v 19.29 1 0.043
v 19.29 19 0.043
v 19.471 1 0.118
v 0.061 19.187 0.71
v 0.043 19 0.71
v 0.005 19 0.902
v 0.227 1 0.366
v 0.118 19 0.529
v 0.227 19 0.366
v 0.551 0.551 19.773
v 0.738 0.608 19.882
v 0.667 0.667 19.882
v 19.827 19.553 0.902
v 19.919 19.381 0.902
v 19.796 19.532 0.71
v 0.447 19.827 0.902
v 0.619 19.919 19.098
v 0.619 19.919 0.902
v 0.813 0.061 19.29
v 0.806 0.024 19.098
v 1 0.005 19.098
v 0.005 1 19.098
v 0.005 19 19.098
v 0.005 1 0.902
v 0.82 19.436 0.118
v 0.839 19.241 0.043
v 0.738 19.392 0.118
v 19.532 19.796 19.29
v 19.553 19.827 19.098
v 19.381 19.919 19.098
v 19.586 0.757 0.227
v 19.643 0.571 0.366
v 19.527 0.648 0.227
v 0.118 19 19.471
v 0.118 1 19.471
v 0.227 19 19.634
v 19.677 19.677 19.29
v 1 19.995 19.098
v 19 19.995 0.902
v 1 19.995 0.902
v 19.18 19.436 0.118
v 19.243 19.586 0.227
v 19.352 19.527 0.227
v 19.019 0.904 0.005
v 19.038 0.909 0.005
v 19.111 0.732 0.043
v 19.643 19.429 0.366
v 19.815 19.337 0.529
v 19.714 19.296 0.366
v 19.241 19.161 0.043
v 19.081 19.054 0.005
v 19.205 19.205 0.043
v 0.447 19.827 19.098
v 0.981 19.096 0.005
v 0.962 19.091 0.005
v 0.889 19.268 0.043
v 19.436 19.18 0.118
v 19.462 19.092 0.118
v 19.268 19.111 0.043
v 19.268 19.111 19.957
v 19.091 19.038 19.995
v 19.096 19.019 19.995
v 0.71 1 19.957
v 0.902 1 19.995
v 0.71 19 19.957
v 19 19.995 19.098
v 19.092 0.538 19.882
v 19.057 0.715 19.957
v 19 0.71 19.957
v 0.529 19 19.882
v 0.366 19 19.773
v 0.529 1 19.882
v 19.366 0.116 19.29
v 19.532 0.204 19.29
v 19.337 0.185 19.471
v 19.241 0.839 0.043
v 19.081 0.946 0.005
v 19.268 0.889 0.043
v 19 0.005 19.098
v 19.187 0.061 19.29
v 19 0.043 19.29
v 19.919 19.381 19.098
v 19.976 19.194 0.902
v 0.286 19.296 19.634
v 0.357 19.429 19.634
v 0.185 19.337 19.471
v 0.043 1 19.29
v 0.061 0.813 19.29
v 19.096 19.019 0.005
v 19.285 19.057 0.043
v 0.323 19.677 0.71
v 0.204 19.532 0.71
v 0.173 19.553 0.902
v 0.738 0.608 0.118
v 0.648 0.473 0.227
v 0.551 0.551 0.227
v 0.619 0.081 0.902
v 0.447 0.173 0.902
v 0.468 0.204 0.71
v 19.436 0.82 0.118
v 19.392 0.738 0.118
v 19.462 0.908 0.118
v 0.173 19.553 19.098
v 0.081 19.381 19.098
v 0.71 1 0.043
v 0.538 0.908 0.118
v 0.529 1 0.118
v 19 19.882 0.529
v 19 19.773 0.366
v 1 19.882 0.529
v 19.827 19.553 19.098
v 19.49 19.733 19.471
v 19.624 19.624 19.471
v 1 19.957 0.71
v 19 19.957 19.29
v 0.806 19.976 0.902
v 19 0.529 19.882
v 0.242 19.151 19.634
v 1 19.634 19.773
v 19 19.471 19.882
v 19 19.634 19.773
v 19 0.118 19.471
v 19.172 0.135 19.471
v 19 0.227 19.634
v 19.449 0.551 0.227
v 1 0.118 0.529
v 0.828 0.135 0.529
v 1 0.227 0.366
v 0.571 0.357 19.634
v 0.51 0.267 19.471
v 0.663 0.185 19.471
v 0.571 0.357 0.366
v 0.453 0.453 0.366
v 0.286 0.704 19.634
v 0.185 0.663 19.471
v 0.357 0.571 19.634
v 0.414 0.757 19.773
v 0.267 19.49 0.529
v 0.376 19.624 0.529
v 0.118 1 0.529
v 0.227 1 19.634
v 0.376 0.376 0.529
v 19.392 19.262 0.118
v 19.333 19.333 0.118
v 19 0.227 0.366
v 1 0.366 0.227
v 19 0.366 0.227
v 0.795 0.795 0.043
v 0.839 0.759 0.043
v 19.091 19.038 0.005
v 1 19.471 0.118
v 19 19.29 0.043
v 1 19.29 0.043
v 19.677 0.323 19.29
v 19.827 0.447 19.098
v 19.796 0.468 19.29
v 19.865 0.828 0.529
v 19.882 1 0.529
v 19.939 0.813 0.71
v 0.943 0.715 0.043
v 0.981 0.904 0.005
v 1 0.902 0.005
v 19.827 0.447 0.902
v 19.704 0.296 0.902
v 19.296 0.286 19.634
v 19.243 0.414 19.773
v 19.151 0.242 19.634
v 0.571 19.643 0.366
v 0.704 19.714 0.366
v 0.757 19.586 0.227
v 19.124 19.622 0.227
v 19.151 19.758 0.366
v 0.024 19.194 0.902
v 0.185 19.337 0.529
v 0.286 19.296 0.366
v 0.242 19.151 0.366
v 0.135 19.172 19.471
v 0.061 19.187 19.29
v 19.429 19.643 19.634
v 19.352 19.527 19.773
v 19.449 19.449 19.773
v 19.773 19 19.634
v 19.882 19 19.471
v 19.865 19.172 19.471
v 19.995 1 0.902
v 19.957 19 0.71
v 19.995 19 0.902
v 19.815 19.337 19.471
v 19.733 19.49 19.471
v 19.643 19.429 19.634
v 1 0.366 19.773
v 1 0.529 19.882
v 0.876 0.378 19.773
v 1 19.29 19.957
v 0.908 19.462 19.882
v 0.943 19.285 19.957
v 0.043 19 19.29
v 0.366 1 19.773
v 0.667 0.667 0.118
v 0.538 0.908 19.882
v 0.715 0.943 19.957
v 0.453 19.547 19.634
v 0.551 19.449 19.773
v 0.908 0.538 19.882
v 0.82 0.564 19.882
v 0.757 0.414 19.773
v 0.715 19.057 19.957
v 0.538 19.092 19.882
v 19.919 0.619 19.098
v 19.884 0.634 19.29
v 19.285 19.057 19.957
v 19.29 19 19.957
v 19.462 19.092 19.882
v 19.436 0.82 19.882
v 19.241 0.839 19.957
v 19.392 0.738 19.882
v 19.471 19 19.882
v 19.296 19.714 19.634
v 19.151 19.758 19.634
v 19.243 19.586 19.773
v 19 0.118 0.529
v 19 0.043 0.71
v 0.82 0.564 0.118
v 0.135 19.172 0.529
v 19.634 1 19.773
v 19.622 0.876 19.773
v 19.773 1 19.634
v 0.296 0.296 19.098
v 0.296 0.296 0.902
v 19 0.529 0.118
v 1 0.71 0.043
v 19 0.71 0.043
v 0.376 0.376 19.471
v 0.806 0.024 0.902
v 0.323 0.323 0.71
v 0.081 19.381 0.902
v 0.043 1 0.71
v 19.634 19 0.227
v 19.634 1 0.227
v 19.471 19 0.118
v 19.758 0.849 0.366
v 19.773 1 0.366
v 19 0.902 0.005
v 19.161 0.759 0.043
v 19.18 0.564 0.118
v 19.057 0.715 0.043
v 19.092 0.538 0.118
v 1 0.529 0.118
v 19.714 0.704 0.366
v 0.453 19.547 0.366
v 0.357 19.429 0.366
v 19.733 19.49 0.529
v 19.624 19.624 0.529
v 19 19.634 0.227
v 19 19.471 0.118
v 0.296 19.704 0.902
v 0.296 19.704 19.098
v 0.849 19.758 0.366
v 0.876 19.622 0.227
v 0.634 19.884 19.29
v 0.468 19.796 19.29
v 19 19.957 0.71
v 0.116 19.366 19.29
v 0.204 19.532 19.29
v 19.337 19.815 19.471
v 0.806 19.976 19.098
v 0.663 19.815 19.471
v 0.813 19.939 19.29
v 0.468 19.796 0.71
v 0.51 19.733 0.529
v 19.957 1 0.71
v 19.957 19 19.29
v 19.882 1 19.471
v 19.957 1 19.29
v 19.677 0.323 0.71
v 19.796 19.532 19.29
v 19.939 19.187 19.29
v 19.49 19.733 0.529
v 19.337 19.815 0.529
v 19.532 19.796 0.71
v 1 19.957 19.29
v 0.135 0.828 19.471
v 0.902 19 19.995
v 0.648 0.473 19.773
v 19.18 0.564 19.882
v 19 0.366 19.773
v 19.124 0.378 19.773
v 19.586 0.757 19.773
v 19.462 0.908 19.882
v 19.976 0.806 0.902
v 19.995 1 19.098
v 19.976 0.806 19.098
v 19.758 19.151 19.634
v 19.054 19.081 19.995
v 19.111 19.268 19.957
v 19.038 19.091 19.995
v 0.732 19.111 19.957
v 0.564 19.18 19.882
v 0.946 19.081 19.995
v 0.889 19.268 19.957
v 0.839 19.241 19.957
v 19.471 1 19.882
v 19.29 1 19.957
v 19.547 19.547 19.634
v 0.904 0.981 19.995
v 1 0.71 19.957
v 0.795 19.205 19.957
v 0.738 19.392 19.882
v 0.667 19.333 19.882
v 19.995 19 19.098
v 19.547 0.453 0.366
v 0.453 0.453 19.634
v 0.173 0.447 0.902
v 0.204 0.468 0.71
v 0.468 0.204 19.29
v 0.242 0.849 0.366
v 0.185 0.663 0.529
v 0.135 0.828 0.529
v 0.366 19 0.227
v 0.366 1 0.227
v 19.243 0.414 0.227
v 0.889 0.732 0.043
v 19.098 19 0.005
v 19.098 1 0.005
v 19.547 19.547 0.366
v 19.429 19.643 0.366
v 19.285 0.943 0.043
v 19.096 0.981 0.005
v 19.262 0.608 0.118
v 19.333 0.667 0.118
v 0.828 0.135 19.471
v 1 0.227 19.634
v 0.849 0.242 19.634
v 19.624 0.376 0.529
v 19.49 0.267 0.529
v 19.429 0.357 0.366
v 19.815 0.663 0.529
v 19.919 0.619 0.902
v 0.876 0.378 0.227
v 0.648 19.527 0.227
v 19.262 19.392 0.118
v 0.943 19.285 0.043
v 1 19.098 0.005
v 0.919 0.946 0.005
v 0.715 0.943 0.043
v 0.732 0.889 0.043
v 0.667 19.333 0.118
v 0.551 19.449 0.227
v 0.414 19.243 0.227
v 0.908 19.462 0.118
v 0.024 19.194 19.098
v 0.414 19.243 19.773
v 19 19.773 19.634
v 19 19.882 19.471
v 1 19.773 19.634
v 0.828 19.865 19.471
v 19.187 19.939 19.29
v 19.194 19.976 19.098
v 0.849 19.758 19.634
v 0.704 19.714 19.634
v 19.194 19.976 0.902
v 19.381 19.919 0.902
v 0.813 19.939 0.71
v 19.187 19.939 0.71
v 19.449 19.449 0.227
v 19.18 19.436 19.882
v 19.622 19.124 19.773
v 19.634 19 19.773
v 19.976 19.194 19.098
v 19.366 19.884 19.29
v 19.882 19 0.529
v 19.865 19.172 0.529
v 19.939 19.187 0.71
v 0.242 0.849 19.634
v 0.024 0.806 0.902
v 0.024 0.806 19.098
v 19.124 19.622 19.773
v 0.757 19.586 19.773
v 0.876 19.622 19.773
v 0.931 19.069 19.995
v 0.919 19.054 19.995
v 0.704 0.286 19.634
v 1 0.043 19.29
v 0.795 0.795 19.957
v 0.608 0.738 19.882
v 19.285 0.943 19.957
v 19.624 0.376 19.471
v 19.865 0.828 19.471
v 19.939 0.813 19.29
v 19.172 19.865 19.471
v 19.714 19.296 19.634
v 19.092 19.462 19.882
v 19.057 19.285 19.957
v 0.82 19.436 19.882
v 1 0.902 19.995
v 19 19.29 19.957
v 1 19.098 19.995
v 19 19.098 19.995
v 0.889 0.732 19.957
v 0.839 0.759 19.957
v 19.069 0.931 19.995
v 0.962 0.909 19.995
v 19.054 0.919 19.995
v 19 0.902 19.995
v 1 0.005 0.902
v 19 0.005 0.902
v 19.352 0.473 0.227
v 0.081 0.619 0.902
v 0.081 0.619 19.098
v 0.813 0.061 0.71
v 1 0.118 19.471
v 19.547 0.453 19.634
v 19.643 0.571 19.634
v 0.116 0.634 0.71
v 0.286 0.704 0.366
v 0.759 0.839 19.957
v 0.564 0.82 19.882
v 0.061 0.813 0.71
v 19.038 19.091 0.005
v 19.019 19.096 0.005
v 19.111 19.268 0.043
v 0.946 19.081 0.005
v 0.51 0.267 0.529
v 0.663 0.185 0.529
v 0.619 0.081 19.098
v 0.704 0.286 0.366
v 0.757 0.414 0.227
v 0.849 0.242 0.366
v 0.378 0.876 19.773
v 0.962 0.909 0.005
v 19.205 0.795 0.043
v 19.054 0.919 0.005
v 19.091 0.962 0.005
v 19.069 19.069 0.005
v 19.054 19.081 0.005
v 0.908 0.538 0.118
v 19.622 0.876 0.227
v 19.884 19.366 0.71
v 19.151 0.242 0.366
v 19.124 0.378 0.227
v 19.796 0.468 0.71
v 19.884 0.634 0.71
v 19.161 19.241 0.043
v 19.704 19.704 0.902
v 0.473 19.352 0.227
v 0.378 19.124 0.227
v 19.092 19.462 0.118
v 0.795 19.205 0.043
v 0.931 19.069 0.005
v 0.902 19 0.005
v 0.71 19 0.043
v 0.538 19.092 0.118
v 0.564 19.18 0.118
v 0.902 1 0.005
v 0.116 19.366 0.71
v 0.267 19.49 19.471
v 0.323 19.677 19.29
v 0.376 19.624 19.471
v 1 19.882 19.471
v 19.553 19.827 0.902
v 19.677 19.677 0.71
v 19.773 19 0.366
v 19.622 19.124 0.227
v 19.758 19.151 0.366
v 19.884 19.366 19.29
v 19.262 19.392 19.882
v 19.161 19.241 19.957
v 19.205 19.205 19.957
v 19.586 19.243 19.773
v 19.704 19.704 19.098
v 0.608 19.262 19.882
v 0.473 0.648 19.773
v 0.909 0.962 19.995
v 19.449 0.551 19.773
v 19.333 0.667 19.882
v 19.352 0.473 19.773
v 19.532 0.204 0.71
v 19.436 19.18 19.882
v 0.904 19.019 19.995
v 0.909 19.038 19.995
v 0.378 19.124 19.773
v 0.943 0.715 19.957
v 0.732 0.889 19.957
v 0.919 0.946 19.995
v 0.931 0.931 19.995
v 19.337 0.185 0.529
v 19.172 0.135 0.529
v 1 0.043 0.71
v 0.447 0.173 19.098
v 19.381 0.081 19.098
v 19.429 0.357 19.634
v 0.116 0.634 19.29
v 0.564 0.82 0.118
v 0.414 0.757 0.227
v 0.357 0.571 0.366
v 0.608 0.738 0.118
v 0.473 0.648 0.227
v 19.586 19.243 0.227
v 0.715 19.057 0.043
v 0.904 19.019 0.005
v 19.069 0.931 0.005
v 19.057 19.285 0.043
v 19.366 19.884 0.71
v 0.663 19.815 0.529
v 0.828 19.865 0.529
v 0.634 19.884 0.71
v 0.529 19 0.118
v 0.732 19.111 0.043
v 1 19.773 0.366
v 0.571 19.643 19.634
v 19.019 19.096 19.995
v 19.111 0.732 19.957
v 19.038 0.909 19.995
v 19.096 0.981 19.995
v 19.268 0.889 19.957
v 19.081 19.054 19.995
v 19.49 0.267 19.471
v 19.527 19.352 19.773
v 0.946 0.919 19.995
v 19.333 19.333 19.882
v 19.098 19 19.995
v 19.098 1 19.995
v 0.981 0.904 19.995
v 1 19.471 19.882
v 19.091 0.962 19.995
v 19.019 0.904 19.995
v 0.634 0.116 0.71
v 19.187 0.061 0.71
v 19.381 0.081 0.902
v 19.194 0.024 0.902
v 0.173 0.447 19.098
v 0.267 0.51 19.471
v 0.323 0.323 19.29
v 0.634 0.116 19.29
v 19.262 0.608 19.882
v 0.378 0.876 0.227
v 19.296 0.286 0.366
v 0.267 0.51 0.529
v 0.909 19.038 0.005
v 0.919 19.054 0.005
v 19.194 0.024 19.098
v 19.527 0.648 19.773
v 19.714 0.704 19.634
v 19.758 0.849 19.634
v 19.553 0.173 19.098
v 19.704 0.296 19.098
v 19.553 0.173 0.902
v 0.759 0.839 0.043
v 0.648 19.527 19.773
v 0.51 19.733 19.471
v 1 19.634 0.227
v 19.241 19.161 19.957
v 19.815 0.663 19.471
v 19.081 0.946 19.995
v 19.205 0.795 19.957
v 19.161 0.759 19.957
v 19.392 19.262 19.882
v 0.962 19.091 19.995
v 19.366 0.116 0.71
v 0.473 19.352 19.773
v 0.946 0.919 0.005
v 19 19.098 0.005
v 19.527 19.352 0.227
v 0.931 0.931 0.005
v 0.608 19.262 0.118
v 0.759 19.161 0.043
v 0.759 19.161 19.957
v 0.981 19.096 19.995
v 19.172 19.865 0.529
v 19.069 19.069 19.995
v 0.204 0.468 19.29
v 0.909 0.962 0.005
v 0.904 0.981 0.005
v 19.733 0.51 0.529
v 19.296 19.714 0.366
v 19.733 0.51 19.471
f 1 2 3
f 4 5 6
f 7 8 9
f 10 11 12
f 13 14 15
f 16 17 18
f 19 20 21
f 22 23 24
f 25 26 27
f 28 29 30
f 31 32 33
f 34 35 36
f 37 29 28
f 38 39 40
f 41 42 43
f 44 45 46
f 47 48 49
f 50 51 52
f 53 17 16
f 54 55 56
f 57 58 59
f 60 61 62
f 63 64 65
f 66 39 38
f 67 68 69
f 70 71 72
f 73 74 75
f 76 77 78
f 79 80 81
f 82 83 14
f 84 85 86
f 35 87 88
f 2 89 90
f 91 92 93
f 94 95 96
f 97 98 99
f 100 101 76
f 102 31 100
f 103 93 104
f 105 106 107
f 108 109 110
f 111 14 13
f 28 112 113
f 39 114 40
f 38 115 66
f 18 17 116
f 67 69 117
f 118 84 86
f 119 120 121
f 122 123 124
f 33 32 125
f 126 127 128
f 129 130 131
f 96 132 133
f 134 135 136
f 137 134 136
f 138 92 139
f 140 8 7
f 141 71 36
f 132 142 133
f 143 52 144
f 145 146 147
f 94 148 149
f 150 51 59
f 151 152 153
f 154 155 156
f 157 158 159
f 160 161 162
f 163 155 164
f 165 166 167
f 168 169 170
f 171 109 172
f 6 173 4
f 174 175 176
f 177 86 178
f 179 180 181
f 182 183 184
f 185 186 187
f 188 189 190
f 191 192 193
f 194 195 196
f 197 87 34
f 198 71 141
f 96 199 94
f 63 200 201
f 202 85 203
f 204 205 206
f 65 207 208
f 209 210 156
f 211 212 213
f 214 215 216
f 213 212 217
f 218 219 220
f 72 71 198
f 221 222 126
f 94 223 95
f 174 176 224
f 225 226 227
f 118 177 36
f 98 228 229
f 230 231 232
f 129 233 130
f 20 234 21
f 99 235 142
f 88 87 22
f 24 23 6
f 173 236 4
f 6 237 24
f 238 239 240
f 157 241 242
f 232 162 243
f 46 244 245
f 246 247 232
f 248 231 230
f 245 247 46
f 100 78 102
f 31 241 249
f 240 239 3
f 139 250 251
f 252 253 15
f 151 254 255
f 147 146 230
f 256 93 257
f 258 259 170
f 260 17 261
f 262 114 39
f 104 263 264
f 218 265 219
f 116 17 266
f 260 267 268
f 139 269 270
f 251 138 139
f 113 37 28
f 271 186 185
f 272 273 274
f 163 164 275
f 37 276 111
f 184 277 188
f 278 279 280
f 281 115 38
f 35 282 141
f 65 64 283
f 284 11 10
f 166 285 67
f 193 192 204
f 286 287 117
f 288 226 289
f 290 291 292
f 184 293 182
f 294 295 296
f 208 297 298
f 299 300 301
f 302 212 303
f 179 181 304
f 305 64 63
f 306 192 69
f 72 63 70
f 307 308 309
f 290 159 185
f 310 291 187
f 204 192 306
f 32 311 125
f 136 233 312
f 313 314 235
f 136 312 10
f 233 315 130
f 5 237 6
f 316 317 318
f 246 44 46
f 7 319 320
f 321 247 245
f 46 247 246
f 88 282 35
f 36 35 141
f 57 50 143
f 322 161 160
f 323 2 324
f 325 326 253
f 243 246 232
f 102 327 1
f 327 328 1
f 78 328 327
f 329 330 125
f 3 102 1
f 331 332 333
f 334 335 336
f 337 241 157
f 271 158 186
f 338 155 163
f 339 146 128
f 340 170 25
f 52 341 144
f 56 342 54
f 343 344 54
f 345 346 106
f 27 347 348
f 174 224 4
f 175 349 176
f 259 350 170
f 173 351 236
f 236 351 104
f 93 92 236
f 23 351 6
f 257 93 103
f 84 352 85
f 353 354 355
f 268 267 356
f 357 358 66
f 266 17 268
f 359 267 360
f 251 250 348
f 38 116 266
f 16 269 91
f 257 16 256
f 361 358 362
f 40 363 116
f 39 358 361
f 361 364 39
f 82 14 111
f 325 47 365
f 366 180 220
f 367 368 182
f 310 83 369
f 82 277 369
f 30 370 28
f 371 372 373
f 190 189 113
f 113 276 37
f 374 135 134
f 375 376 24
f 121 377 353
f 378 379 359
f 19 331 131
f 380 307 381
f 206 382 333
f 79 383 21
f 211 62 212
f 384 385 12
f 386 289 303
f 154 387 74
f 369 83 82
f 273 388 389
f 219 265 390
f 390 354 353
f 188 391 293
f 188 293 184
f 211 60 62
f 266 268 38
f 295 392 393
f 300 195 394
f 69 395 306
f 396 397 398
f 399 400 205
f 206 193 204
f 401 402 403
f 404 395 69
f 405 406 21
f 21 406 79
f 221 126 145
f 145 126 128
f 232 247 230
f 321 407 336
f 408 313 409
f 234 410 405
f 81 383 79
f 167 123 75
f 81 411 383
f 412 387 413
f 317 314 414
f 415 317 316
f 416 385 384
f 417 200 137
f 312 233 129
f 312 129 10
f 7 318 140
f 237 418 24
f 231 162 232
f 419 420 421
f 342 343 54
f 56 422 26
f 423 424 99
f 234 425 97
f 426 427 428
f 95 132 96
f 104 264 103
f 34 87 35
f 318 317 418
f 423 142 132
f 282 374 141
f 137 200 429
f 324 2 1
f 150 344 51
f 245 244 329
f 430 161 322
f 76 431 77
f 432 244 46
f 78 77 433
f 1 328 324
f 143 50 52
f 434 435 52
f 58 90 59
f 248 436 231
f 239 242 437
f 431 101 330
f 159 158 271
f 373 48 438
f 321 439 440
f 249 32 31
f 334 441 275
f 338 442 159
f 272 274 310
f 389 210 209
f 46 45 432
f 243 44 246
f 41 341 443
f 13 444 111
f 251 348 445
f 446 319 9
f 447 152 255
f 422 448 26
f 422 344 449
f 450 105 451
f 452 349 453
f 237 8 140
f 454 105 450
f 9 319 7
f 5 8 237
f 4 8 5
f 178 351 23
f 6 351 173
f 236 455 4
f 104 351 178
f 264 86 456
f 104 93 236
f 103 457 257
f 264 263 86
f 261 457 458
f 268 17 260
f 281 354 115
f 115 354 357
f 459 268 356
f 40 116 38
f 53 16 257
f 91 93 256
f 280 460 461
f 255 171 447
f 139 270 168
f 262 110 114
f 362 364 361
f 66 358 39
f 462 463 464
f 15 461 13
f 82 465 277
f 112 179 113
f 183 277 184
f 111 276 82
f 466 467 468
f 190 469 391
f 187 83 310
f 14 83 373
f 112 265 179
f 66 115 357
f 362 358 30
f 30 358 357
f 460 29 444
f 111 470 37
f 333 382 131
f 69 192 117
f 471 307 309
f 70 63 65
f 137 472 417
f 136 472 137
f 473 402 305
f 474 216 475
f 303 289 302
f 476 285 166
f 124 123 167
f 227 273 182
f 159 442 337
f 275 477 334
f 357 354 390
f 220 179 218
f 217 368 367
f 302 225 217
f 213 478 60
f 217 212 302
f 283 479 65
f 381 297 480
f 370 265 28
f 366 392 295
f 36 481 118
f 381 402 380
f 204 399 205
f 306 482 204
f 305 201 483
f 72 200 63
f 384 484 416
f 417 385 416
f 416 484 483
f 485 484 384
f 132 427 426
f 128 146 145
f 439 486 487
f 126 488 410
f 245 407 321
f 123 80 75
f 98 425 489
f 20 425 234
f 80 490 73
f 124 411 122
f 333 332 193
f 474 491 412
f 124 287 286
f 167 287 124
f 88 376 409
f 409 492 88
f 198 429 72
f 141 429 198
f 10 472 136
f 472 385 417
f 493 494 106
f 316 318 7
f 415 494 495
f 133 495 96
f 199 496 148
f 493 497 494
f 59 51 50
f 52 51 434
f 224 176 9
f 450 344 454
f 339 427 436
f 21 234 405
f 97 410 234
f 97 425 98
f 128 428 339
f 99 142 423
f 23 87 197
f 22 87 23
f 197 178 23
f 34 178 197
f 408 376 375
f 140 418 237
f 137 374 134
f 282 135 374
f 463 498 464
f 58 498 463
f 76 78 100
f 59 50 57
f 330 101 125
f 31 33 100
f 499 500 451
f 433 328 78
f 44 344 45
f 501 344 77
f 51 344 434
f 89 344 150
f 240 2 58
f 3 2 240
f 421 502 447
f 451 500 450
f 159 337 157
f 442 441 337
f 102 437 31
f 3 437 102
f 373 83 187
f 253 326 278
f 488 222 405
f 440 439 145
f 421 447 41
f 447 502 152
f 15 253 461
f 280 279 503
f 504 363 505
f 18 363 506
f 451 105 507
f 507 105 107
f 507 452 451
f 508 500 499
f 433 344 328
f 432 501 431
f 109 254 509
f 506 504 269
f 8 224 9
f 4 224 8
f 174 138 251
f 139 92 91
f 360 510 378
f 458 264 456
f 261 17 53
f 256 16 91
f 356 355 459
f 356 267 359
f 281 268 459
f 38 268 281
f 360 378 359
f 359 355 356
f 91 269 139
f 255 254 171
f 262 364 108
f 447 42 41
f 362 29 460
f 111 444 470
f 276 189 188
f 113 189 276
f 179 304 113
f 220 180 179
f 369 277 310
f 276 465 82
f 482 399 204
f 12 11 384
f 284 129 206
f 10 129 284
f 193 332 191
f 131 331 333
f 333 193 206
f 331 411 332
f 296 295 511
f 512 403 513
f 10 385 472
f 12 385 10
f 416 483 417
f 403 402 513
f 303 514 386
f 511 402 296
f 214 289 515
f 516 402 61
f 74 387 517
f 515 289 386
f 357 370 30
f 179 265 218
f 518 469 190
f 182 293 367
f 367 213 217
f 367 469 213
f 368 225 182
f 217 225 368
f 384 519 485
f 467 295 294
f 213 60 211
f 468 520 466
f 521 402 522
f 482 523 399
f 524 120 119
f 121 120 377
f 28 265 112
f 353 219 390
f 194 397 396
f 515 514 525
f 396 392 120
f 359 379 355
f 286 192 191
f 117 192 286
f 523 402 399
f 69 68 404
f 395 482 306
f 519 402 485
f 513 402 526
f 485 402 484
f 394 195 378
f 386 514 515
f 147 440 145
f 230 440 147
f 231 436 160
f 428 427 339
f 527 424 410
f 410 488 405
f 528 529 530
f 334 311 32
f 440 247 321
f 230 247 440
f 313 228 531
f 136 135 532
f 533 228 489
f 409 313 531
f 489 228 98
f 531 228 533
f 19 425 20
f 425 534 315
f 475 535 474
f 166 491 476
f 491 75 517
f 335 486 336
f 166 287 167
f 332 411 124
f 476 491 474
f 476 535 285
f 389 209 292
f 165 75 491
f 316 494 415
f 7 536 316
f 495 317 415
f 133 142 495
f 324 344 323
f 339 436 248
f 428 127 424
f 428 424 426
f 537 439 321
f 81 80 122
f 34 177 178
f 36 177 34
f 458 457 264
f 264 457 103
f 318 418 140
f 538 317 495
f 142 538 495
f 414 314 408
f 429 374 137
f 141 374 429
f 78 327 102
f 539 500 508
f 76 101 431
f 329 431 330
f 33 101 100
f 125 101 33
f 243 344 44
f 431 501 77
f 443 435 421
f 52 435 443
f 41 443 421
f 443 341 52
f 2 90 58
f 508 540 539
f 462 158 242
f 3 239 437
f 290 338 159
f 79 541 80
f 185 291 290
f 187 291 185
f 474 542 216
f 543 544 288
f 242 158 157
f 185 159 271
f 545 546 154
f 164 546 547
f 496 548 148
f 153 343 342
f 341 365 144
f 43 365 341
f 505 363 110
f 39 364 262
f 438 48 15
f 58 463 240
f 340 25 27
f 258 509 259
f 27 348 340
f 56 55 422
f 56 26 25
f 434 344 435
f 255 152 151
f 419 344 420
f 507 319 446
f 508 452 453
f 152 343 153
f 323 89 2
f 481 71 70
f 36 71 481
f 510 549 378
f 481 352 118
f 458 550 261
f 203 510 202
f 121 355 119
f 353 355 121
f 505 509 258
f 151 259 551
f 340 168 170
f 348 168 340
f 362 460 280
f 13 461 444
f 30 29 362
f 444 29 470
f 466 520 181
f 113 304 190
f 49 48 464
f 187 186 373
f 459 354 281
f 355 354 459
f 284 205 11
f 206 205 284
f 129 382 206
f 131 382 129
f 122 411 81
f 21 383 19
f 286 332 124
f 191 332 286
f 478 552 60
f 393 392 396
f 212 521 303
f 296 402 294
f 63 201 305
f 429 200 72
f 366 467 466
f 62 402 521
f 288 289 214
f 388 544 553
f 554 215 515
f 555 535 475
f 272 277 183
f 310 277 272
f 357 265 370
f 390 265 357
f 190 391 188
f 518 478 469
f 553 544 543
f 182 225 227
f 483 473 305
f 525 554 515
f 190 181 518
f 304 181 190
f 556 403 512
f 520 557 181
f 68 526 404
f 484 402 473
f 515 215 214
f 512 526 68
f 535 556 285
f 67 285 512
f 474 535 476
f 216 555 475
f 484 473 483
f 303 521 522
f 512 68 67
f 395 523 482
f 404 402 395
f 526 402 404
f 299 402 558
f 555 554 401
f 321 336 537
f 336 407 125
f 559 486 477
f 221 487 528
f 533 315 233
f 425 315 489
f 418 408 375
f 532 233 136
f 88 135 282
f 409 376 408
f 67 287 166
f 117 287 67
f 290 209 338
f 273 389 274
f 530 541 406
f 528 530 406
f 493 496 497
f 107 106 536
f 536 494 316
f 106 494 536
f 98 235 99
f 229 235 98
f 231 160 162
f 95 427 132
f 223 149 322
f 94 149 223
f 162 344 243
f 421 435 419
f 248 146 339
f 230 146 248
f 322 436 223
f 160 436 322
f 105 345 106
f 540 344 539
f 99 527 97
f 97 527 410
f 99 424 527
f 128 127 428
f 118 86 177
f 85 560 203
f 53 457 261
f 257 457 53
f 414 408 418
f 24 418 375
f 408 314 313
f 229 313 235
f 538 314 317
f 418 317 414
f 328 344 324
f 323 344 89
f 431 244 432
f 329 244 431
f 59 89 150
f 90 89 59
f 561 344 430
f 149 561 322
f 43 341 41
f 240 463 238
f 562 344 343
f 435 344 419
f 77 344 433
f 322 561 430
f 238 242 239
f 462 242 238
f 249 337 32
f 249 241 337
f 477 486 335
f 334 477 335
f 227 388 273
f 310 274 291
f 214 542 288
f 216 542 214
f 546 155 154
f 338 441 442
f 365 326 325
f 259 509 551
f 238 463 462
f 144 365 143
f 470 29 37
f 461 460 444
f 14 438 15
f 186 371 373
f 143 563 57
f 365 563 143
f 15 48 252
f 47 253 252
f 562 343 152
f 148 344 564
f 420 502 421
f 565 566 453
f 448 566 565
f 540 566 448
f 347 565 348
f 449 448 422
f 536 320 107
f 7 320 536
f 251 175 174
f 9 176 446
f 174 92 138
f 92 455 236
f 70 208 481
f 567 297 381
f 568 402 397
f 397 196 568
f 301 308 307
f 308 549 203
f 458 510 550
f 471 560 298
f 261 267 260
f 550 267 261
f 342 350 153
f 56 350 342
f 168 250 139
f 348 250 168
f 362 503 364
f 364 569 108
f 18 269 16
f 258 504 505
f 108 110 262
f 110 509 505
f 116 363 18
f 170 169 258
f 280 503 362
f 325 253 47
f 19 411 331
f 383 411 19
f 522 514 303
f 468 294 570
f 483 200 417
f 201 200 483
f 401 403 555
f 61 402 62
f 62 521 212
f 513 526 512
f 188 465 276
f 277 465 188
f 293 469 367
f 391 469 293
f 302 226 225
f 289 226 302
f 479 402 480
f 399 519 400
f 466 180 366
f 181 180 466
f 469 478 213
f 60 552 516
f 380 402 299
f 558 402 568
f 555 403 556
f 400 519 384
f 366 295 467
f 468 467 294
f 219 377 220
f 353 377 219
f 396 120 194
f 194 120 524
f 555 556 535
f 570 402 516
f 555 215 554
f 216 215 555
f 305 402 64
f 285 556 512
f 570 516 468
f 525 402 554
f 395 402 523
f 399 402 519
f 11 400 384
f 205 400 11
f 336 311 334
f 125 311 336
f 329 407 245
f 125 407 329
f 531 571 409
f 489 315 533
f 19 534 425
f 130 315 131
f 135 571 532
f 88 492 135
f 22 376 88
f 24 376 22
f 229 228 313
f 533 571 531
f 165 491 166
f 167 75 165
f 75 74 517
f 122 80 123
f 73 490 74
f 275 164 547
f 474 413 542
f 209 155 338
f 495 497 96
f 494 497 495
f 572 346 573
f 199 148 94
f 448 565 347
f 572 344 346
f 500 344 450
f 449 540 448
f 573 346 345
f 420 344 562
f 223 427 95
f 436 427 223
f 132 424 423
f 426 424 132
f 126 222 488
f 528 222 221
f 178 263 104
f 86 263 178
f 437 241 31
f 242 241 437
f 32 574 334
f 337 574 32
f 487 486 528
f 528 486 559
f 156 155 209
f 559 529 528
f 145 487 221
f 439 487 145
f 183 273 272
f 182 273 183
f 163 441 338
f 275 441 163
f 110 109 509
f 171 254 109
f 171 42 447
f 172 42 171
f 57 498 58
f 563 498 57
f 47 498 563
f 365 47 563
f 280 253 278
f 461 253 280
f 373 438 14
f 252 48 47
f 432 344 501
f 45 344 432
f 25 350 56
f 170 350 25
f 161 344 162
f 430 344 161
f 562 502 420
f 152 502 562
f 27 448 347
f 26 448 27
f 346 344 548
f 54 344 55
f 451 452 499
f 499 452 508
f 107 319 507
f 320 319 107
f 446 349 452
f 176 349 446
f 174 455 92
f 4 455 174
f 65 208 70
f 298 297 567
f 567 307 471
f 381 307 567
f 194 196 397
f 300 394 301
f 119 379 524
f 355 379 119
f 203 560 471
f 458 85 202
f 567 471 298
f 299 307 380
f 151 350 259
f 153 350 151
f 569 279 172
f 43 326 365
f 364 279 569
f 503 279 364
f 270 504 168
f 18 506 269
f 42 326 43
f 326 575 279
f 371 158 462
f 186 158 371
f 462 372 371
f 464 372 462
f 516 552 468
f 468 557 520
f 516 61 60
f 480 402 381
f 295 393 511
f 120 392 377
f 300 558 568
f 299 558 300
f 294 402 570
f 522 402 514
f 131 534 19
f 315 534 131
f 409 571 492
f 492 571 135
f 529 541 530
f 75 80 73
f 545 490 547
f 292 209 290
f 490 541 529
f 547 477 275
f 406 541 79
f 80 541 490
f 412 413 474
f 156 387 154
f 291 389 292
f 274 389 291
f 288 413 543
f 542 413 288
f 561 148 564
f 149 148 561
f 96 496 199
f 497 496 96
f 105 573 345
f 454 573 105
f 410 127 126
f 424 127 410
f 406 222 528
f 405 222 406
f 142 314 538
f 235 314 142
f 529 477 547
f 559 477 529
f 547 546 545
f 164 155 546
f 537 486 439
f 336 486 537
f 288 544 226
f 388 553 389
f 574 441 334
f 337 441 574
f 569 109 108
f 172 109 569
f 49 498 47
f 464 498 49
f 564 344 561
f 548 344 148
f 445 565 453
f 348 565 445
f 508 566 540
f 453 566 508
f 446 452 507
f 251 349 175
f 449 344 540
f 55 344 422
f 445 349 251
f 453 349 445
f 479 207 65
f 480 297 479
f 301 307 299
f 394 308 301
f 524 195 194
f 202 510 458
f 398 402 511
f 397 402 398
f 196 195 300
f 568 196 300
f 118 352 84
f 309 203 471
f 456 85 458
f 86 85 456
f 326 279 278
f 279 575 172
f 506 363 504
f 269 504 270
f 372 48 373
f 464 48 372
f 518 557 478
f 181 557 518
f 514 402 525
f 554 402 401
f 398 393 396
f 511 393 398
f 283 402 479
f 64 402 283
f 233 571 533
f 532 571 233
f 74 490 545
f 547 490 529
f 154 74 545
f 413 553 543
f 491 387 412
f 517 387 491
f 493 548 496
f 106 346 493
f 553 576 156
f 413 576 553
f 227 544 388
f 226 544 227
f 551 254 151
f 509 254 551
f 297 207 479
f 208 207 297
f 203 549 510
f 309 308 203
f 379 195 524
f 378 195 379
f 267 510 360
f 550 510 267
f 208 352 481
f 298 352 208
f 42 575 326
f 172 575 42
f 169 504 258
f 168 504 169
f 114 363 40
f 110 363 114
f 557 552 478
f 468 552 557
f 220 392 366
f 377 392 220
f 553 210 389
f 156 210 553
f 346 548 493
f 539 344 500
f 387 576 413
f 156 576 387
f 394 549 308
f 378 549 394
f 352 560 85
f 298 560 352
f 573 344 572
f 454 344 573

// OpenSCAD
hull()translate([0,0,10.000000])union(){translate([0,0,-10.000000])translate([0,10.000000,0])union(){translate([0,-10.000000,0])translate([10.000000,0,0])union(){translate([-10.000000,0,0])translate([1,1,1])sphere(d=2,$fn=32);mirror([1,0,0])translate([-10.000000,0,0])translate([1,1,1])sphere(d=2,$fn=32);}mirror([0,1,0])translate([0,-10.000000,0])translate([10.000000,0,0])union(){translate([-10.000000,0,0])translate([1,1,1])sphere(d=2,$fn=32);mirror([1,0,0])translate([-10.000000,0,0])translate([1,1,1])sphere(d=2,$fn=32);}}mirror([0,0,1])translate([0,0,-10.000000])translate([0,10.000000,0])union(){translate([0,-10.000000,0])translate([10.000000,0,0])union(){translate([-10.000000,0,0])translate([1,1,1])sphere(d=2,$fn=32);mirror([1,0,0])translate([-10.000000,0,0])translate([1,1,1])sphere(d=2,$fn=32);}mirror([0,1,0])translate([0,-10.000000,0])translate([10.000000,0,0])union(){translate([-10.000000,0,0])translate([1,1,1])sphere(d=2,$fn=32);mirror([1,0,0])translate([-10.000000,0,0])translate([1,1,1])sphere(d=2,$fn=32);}}}
